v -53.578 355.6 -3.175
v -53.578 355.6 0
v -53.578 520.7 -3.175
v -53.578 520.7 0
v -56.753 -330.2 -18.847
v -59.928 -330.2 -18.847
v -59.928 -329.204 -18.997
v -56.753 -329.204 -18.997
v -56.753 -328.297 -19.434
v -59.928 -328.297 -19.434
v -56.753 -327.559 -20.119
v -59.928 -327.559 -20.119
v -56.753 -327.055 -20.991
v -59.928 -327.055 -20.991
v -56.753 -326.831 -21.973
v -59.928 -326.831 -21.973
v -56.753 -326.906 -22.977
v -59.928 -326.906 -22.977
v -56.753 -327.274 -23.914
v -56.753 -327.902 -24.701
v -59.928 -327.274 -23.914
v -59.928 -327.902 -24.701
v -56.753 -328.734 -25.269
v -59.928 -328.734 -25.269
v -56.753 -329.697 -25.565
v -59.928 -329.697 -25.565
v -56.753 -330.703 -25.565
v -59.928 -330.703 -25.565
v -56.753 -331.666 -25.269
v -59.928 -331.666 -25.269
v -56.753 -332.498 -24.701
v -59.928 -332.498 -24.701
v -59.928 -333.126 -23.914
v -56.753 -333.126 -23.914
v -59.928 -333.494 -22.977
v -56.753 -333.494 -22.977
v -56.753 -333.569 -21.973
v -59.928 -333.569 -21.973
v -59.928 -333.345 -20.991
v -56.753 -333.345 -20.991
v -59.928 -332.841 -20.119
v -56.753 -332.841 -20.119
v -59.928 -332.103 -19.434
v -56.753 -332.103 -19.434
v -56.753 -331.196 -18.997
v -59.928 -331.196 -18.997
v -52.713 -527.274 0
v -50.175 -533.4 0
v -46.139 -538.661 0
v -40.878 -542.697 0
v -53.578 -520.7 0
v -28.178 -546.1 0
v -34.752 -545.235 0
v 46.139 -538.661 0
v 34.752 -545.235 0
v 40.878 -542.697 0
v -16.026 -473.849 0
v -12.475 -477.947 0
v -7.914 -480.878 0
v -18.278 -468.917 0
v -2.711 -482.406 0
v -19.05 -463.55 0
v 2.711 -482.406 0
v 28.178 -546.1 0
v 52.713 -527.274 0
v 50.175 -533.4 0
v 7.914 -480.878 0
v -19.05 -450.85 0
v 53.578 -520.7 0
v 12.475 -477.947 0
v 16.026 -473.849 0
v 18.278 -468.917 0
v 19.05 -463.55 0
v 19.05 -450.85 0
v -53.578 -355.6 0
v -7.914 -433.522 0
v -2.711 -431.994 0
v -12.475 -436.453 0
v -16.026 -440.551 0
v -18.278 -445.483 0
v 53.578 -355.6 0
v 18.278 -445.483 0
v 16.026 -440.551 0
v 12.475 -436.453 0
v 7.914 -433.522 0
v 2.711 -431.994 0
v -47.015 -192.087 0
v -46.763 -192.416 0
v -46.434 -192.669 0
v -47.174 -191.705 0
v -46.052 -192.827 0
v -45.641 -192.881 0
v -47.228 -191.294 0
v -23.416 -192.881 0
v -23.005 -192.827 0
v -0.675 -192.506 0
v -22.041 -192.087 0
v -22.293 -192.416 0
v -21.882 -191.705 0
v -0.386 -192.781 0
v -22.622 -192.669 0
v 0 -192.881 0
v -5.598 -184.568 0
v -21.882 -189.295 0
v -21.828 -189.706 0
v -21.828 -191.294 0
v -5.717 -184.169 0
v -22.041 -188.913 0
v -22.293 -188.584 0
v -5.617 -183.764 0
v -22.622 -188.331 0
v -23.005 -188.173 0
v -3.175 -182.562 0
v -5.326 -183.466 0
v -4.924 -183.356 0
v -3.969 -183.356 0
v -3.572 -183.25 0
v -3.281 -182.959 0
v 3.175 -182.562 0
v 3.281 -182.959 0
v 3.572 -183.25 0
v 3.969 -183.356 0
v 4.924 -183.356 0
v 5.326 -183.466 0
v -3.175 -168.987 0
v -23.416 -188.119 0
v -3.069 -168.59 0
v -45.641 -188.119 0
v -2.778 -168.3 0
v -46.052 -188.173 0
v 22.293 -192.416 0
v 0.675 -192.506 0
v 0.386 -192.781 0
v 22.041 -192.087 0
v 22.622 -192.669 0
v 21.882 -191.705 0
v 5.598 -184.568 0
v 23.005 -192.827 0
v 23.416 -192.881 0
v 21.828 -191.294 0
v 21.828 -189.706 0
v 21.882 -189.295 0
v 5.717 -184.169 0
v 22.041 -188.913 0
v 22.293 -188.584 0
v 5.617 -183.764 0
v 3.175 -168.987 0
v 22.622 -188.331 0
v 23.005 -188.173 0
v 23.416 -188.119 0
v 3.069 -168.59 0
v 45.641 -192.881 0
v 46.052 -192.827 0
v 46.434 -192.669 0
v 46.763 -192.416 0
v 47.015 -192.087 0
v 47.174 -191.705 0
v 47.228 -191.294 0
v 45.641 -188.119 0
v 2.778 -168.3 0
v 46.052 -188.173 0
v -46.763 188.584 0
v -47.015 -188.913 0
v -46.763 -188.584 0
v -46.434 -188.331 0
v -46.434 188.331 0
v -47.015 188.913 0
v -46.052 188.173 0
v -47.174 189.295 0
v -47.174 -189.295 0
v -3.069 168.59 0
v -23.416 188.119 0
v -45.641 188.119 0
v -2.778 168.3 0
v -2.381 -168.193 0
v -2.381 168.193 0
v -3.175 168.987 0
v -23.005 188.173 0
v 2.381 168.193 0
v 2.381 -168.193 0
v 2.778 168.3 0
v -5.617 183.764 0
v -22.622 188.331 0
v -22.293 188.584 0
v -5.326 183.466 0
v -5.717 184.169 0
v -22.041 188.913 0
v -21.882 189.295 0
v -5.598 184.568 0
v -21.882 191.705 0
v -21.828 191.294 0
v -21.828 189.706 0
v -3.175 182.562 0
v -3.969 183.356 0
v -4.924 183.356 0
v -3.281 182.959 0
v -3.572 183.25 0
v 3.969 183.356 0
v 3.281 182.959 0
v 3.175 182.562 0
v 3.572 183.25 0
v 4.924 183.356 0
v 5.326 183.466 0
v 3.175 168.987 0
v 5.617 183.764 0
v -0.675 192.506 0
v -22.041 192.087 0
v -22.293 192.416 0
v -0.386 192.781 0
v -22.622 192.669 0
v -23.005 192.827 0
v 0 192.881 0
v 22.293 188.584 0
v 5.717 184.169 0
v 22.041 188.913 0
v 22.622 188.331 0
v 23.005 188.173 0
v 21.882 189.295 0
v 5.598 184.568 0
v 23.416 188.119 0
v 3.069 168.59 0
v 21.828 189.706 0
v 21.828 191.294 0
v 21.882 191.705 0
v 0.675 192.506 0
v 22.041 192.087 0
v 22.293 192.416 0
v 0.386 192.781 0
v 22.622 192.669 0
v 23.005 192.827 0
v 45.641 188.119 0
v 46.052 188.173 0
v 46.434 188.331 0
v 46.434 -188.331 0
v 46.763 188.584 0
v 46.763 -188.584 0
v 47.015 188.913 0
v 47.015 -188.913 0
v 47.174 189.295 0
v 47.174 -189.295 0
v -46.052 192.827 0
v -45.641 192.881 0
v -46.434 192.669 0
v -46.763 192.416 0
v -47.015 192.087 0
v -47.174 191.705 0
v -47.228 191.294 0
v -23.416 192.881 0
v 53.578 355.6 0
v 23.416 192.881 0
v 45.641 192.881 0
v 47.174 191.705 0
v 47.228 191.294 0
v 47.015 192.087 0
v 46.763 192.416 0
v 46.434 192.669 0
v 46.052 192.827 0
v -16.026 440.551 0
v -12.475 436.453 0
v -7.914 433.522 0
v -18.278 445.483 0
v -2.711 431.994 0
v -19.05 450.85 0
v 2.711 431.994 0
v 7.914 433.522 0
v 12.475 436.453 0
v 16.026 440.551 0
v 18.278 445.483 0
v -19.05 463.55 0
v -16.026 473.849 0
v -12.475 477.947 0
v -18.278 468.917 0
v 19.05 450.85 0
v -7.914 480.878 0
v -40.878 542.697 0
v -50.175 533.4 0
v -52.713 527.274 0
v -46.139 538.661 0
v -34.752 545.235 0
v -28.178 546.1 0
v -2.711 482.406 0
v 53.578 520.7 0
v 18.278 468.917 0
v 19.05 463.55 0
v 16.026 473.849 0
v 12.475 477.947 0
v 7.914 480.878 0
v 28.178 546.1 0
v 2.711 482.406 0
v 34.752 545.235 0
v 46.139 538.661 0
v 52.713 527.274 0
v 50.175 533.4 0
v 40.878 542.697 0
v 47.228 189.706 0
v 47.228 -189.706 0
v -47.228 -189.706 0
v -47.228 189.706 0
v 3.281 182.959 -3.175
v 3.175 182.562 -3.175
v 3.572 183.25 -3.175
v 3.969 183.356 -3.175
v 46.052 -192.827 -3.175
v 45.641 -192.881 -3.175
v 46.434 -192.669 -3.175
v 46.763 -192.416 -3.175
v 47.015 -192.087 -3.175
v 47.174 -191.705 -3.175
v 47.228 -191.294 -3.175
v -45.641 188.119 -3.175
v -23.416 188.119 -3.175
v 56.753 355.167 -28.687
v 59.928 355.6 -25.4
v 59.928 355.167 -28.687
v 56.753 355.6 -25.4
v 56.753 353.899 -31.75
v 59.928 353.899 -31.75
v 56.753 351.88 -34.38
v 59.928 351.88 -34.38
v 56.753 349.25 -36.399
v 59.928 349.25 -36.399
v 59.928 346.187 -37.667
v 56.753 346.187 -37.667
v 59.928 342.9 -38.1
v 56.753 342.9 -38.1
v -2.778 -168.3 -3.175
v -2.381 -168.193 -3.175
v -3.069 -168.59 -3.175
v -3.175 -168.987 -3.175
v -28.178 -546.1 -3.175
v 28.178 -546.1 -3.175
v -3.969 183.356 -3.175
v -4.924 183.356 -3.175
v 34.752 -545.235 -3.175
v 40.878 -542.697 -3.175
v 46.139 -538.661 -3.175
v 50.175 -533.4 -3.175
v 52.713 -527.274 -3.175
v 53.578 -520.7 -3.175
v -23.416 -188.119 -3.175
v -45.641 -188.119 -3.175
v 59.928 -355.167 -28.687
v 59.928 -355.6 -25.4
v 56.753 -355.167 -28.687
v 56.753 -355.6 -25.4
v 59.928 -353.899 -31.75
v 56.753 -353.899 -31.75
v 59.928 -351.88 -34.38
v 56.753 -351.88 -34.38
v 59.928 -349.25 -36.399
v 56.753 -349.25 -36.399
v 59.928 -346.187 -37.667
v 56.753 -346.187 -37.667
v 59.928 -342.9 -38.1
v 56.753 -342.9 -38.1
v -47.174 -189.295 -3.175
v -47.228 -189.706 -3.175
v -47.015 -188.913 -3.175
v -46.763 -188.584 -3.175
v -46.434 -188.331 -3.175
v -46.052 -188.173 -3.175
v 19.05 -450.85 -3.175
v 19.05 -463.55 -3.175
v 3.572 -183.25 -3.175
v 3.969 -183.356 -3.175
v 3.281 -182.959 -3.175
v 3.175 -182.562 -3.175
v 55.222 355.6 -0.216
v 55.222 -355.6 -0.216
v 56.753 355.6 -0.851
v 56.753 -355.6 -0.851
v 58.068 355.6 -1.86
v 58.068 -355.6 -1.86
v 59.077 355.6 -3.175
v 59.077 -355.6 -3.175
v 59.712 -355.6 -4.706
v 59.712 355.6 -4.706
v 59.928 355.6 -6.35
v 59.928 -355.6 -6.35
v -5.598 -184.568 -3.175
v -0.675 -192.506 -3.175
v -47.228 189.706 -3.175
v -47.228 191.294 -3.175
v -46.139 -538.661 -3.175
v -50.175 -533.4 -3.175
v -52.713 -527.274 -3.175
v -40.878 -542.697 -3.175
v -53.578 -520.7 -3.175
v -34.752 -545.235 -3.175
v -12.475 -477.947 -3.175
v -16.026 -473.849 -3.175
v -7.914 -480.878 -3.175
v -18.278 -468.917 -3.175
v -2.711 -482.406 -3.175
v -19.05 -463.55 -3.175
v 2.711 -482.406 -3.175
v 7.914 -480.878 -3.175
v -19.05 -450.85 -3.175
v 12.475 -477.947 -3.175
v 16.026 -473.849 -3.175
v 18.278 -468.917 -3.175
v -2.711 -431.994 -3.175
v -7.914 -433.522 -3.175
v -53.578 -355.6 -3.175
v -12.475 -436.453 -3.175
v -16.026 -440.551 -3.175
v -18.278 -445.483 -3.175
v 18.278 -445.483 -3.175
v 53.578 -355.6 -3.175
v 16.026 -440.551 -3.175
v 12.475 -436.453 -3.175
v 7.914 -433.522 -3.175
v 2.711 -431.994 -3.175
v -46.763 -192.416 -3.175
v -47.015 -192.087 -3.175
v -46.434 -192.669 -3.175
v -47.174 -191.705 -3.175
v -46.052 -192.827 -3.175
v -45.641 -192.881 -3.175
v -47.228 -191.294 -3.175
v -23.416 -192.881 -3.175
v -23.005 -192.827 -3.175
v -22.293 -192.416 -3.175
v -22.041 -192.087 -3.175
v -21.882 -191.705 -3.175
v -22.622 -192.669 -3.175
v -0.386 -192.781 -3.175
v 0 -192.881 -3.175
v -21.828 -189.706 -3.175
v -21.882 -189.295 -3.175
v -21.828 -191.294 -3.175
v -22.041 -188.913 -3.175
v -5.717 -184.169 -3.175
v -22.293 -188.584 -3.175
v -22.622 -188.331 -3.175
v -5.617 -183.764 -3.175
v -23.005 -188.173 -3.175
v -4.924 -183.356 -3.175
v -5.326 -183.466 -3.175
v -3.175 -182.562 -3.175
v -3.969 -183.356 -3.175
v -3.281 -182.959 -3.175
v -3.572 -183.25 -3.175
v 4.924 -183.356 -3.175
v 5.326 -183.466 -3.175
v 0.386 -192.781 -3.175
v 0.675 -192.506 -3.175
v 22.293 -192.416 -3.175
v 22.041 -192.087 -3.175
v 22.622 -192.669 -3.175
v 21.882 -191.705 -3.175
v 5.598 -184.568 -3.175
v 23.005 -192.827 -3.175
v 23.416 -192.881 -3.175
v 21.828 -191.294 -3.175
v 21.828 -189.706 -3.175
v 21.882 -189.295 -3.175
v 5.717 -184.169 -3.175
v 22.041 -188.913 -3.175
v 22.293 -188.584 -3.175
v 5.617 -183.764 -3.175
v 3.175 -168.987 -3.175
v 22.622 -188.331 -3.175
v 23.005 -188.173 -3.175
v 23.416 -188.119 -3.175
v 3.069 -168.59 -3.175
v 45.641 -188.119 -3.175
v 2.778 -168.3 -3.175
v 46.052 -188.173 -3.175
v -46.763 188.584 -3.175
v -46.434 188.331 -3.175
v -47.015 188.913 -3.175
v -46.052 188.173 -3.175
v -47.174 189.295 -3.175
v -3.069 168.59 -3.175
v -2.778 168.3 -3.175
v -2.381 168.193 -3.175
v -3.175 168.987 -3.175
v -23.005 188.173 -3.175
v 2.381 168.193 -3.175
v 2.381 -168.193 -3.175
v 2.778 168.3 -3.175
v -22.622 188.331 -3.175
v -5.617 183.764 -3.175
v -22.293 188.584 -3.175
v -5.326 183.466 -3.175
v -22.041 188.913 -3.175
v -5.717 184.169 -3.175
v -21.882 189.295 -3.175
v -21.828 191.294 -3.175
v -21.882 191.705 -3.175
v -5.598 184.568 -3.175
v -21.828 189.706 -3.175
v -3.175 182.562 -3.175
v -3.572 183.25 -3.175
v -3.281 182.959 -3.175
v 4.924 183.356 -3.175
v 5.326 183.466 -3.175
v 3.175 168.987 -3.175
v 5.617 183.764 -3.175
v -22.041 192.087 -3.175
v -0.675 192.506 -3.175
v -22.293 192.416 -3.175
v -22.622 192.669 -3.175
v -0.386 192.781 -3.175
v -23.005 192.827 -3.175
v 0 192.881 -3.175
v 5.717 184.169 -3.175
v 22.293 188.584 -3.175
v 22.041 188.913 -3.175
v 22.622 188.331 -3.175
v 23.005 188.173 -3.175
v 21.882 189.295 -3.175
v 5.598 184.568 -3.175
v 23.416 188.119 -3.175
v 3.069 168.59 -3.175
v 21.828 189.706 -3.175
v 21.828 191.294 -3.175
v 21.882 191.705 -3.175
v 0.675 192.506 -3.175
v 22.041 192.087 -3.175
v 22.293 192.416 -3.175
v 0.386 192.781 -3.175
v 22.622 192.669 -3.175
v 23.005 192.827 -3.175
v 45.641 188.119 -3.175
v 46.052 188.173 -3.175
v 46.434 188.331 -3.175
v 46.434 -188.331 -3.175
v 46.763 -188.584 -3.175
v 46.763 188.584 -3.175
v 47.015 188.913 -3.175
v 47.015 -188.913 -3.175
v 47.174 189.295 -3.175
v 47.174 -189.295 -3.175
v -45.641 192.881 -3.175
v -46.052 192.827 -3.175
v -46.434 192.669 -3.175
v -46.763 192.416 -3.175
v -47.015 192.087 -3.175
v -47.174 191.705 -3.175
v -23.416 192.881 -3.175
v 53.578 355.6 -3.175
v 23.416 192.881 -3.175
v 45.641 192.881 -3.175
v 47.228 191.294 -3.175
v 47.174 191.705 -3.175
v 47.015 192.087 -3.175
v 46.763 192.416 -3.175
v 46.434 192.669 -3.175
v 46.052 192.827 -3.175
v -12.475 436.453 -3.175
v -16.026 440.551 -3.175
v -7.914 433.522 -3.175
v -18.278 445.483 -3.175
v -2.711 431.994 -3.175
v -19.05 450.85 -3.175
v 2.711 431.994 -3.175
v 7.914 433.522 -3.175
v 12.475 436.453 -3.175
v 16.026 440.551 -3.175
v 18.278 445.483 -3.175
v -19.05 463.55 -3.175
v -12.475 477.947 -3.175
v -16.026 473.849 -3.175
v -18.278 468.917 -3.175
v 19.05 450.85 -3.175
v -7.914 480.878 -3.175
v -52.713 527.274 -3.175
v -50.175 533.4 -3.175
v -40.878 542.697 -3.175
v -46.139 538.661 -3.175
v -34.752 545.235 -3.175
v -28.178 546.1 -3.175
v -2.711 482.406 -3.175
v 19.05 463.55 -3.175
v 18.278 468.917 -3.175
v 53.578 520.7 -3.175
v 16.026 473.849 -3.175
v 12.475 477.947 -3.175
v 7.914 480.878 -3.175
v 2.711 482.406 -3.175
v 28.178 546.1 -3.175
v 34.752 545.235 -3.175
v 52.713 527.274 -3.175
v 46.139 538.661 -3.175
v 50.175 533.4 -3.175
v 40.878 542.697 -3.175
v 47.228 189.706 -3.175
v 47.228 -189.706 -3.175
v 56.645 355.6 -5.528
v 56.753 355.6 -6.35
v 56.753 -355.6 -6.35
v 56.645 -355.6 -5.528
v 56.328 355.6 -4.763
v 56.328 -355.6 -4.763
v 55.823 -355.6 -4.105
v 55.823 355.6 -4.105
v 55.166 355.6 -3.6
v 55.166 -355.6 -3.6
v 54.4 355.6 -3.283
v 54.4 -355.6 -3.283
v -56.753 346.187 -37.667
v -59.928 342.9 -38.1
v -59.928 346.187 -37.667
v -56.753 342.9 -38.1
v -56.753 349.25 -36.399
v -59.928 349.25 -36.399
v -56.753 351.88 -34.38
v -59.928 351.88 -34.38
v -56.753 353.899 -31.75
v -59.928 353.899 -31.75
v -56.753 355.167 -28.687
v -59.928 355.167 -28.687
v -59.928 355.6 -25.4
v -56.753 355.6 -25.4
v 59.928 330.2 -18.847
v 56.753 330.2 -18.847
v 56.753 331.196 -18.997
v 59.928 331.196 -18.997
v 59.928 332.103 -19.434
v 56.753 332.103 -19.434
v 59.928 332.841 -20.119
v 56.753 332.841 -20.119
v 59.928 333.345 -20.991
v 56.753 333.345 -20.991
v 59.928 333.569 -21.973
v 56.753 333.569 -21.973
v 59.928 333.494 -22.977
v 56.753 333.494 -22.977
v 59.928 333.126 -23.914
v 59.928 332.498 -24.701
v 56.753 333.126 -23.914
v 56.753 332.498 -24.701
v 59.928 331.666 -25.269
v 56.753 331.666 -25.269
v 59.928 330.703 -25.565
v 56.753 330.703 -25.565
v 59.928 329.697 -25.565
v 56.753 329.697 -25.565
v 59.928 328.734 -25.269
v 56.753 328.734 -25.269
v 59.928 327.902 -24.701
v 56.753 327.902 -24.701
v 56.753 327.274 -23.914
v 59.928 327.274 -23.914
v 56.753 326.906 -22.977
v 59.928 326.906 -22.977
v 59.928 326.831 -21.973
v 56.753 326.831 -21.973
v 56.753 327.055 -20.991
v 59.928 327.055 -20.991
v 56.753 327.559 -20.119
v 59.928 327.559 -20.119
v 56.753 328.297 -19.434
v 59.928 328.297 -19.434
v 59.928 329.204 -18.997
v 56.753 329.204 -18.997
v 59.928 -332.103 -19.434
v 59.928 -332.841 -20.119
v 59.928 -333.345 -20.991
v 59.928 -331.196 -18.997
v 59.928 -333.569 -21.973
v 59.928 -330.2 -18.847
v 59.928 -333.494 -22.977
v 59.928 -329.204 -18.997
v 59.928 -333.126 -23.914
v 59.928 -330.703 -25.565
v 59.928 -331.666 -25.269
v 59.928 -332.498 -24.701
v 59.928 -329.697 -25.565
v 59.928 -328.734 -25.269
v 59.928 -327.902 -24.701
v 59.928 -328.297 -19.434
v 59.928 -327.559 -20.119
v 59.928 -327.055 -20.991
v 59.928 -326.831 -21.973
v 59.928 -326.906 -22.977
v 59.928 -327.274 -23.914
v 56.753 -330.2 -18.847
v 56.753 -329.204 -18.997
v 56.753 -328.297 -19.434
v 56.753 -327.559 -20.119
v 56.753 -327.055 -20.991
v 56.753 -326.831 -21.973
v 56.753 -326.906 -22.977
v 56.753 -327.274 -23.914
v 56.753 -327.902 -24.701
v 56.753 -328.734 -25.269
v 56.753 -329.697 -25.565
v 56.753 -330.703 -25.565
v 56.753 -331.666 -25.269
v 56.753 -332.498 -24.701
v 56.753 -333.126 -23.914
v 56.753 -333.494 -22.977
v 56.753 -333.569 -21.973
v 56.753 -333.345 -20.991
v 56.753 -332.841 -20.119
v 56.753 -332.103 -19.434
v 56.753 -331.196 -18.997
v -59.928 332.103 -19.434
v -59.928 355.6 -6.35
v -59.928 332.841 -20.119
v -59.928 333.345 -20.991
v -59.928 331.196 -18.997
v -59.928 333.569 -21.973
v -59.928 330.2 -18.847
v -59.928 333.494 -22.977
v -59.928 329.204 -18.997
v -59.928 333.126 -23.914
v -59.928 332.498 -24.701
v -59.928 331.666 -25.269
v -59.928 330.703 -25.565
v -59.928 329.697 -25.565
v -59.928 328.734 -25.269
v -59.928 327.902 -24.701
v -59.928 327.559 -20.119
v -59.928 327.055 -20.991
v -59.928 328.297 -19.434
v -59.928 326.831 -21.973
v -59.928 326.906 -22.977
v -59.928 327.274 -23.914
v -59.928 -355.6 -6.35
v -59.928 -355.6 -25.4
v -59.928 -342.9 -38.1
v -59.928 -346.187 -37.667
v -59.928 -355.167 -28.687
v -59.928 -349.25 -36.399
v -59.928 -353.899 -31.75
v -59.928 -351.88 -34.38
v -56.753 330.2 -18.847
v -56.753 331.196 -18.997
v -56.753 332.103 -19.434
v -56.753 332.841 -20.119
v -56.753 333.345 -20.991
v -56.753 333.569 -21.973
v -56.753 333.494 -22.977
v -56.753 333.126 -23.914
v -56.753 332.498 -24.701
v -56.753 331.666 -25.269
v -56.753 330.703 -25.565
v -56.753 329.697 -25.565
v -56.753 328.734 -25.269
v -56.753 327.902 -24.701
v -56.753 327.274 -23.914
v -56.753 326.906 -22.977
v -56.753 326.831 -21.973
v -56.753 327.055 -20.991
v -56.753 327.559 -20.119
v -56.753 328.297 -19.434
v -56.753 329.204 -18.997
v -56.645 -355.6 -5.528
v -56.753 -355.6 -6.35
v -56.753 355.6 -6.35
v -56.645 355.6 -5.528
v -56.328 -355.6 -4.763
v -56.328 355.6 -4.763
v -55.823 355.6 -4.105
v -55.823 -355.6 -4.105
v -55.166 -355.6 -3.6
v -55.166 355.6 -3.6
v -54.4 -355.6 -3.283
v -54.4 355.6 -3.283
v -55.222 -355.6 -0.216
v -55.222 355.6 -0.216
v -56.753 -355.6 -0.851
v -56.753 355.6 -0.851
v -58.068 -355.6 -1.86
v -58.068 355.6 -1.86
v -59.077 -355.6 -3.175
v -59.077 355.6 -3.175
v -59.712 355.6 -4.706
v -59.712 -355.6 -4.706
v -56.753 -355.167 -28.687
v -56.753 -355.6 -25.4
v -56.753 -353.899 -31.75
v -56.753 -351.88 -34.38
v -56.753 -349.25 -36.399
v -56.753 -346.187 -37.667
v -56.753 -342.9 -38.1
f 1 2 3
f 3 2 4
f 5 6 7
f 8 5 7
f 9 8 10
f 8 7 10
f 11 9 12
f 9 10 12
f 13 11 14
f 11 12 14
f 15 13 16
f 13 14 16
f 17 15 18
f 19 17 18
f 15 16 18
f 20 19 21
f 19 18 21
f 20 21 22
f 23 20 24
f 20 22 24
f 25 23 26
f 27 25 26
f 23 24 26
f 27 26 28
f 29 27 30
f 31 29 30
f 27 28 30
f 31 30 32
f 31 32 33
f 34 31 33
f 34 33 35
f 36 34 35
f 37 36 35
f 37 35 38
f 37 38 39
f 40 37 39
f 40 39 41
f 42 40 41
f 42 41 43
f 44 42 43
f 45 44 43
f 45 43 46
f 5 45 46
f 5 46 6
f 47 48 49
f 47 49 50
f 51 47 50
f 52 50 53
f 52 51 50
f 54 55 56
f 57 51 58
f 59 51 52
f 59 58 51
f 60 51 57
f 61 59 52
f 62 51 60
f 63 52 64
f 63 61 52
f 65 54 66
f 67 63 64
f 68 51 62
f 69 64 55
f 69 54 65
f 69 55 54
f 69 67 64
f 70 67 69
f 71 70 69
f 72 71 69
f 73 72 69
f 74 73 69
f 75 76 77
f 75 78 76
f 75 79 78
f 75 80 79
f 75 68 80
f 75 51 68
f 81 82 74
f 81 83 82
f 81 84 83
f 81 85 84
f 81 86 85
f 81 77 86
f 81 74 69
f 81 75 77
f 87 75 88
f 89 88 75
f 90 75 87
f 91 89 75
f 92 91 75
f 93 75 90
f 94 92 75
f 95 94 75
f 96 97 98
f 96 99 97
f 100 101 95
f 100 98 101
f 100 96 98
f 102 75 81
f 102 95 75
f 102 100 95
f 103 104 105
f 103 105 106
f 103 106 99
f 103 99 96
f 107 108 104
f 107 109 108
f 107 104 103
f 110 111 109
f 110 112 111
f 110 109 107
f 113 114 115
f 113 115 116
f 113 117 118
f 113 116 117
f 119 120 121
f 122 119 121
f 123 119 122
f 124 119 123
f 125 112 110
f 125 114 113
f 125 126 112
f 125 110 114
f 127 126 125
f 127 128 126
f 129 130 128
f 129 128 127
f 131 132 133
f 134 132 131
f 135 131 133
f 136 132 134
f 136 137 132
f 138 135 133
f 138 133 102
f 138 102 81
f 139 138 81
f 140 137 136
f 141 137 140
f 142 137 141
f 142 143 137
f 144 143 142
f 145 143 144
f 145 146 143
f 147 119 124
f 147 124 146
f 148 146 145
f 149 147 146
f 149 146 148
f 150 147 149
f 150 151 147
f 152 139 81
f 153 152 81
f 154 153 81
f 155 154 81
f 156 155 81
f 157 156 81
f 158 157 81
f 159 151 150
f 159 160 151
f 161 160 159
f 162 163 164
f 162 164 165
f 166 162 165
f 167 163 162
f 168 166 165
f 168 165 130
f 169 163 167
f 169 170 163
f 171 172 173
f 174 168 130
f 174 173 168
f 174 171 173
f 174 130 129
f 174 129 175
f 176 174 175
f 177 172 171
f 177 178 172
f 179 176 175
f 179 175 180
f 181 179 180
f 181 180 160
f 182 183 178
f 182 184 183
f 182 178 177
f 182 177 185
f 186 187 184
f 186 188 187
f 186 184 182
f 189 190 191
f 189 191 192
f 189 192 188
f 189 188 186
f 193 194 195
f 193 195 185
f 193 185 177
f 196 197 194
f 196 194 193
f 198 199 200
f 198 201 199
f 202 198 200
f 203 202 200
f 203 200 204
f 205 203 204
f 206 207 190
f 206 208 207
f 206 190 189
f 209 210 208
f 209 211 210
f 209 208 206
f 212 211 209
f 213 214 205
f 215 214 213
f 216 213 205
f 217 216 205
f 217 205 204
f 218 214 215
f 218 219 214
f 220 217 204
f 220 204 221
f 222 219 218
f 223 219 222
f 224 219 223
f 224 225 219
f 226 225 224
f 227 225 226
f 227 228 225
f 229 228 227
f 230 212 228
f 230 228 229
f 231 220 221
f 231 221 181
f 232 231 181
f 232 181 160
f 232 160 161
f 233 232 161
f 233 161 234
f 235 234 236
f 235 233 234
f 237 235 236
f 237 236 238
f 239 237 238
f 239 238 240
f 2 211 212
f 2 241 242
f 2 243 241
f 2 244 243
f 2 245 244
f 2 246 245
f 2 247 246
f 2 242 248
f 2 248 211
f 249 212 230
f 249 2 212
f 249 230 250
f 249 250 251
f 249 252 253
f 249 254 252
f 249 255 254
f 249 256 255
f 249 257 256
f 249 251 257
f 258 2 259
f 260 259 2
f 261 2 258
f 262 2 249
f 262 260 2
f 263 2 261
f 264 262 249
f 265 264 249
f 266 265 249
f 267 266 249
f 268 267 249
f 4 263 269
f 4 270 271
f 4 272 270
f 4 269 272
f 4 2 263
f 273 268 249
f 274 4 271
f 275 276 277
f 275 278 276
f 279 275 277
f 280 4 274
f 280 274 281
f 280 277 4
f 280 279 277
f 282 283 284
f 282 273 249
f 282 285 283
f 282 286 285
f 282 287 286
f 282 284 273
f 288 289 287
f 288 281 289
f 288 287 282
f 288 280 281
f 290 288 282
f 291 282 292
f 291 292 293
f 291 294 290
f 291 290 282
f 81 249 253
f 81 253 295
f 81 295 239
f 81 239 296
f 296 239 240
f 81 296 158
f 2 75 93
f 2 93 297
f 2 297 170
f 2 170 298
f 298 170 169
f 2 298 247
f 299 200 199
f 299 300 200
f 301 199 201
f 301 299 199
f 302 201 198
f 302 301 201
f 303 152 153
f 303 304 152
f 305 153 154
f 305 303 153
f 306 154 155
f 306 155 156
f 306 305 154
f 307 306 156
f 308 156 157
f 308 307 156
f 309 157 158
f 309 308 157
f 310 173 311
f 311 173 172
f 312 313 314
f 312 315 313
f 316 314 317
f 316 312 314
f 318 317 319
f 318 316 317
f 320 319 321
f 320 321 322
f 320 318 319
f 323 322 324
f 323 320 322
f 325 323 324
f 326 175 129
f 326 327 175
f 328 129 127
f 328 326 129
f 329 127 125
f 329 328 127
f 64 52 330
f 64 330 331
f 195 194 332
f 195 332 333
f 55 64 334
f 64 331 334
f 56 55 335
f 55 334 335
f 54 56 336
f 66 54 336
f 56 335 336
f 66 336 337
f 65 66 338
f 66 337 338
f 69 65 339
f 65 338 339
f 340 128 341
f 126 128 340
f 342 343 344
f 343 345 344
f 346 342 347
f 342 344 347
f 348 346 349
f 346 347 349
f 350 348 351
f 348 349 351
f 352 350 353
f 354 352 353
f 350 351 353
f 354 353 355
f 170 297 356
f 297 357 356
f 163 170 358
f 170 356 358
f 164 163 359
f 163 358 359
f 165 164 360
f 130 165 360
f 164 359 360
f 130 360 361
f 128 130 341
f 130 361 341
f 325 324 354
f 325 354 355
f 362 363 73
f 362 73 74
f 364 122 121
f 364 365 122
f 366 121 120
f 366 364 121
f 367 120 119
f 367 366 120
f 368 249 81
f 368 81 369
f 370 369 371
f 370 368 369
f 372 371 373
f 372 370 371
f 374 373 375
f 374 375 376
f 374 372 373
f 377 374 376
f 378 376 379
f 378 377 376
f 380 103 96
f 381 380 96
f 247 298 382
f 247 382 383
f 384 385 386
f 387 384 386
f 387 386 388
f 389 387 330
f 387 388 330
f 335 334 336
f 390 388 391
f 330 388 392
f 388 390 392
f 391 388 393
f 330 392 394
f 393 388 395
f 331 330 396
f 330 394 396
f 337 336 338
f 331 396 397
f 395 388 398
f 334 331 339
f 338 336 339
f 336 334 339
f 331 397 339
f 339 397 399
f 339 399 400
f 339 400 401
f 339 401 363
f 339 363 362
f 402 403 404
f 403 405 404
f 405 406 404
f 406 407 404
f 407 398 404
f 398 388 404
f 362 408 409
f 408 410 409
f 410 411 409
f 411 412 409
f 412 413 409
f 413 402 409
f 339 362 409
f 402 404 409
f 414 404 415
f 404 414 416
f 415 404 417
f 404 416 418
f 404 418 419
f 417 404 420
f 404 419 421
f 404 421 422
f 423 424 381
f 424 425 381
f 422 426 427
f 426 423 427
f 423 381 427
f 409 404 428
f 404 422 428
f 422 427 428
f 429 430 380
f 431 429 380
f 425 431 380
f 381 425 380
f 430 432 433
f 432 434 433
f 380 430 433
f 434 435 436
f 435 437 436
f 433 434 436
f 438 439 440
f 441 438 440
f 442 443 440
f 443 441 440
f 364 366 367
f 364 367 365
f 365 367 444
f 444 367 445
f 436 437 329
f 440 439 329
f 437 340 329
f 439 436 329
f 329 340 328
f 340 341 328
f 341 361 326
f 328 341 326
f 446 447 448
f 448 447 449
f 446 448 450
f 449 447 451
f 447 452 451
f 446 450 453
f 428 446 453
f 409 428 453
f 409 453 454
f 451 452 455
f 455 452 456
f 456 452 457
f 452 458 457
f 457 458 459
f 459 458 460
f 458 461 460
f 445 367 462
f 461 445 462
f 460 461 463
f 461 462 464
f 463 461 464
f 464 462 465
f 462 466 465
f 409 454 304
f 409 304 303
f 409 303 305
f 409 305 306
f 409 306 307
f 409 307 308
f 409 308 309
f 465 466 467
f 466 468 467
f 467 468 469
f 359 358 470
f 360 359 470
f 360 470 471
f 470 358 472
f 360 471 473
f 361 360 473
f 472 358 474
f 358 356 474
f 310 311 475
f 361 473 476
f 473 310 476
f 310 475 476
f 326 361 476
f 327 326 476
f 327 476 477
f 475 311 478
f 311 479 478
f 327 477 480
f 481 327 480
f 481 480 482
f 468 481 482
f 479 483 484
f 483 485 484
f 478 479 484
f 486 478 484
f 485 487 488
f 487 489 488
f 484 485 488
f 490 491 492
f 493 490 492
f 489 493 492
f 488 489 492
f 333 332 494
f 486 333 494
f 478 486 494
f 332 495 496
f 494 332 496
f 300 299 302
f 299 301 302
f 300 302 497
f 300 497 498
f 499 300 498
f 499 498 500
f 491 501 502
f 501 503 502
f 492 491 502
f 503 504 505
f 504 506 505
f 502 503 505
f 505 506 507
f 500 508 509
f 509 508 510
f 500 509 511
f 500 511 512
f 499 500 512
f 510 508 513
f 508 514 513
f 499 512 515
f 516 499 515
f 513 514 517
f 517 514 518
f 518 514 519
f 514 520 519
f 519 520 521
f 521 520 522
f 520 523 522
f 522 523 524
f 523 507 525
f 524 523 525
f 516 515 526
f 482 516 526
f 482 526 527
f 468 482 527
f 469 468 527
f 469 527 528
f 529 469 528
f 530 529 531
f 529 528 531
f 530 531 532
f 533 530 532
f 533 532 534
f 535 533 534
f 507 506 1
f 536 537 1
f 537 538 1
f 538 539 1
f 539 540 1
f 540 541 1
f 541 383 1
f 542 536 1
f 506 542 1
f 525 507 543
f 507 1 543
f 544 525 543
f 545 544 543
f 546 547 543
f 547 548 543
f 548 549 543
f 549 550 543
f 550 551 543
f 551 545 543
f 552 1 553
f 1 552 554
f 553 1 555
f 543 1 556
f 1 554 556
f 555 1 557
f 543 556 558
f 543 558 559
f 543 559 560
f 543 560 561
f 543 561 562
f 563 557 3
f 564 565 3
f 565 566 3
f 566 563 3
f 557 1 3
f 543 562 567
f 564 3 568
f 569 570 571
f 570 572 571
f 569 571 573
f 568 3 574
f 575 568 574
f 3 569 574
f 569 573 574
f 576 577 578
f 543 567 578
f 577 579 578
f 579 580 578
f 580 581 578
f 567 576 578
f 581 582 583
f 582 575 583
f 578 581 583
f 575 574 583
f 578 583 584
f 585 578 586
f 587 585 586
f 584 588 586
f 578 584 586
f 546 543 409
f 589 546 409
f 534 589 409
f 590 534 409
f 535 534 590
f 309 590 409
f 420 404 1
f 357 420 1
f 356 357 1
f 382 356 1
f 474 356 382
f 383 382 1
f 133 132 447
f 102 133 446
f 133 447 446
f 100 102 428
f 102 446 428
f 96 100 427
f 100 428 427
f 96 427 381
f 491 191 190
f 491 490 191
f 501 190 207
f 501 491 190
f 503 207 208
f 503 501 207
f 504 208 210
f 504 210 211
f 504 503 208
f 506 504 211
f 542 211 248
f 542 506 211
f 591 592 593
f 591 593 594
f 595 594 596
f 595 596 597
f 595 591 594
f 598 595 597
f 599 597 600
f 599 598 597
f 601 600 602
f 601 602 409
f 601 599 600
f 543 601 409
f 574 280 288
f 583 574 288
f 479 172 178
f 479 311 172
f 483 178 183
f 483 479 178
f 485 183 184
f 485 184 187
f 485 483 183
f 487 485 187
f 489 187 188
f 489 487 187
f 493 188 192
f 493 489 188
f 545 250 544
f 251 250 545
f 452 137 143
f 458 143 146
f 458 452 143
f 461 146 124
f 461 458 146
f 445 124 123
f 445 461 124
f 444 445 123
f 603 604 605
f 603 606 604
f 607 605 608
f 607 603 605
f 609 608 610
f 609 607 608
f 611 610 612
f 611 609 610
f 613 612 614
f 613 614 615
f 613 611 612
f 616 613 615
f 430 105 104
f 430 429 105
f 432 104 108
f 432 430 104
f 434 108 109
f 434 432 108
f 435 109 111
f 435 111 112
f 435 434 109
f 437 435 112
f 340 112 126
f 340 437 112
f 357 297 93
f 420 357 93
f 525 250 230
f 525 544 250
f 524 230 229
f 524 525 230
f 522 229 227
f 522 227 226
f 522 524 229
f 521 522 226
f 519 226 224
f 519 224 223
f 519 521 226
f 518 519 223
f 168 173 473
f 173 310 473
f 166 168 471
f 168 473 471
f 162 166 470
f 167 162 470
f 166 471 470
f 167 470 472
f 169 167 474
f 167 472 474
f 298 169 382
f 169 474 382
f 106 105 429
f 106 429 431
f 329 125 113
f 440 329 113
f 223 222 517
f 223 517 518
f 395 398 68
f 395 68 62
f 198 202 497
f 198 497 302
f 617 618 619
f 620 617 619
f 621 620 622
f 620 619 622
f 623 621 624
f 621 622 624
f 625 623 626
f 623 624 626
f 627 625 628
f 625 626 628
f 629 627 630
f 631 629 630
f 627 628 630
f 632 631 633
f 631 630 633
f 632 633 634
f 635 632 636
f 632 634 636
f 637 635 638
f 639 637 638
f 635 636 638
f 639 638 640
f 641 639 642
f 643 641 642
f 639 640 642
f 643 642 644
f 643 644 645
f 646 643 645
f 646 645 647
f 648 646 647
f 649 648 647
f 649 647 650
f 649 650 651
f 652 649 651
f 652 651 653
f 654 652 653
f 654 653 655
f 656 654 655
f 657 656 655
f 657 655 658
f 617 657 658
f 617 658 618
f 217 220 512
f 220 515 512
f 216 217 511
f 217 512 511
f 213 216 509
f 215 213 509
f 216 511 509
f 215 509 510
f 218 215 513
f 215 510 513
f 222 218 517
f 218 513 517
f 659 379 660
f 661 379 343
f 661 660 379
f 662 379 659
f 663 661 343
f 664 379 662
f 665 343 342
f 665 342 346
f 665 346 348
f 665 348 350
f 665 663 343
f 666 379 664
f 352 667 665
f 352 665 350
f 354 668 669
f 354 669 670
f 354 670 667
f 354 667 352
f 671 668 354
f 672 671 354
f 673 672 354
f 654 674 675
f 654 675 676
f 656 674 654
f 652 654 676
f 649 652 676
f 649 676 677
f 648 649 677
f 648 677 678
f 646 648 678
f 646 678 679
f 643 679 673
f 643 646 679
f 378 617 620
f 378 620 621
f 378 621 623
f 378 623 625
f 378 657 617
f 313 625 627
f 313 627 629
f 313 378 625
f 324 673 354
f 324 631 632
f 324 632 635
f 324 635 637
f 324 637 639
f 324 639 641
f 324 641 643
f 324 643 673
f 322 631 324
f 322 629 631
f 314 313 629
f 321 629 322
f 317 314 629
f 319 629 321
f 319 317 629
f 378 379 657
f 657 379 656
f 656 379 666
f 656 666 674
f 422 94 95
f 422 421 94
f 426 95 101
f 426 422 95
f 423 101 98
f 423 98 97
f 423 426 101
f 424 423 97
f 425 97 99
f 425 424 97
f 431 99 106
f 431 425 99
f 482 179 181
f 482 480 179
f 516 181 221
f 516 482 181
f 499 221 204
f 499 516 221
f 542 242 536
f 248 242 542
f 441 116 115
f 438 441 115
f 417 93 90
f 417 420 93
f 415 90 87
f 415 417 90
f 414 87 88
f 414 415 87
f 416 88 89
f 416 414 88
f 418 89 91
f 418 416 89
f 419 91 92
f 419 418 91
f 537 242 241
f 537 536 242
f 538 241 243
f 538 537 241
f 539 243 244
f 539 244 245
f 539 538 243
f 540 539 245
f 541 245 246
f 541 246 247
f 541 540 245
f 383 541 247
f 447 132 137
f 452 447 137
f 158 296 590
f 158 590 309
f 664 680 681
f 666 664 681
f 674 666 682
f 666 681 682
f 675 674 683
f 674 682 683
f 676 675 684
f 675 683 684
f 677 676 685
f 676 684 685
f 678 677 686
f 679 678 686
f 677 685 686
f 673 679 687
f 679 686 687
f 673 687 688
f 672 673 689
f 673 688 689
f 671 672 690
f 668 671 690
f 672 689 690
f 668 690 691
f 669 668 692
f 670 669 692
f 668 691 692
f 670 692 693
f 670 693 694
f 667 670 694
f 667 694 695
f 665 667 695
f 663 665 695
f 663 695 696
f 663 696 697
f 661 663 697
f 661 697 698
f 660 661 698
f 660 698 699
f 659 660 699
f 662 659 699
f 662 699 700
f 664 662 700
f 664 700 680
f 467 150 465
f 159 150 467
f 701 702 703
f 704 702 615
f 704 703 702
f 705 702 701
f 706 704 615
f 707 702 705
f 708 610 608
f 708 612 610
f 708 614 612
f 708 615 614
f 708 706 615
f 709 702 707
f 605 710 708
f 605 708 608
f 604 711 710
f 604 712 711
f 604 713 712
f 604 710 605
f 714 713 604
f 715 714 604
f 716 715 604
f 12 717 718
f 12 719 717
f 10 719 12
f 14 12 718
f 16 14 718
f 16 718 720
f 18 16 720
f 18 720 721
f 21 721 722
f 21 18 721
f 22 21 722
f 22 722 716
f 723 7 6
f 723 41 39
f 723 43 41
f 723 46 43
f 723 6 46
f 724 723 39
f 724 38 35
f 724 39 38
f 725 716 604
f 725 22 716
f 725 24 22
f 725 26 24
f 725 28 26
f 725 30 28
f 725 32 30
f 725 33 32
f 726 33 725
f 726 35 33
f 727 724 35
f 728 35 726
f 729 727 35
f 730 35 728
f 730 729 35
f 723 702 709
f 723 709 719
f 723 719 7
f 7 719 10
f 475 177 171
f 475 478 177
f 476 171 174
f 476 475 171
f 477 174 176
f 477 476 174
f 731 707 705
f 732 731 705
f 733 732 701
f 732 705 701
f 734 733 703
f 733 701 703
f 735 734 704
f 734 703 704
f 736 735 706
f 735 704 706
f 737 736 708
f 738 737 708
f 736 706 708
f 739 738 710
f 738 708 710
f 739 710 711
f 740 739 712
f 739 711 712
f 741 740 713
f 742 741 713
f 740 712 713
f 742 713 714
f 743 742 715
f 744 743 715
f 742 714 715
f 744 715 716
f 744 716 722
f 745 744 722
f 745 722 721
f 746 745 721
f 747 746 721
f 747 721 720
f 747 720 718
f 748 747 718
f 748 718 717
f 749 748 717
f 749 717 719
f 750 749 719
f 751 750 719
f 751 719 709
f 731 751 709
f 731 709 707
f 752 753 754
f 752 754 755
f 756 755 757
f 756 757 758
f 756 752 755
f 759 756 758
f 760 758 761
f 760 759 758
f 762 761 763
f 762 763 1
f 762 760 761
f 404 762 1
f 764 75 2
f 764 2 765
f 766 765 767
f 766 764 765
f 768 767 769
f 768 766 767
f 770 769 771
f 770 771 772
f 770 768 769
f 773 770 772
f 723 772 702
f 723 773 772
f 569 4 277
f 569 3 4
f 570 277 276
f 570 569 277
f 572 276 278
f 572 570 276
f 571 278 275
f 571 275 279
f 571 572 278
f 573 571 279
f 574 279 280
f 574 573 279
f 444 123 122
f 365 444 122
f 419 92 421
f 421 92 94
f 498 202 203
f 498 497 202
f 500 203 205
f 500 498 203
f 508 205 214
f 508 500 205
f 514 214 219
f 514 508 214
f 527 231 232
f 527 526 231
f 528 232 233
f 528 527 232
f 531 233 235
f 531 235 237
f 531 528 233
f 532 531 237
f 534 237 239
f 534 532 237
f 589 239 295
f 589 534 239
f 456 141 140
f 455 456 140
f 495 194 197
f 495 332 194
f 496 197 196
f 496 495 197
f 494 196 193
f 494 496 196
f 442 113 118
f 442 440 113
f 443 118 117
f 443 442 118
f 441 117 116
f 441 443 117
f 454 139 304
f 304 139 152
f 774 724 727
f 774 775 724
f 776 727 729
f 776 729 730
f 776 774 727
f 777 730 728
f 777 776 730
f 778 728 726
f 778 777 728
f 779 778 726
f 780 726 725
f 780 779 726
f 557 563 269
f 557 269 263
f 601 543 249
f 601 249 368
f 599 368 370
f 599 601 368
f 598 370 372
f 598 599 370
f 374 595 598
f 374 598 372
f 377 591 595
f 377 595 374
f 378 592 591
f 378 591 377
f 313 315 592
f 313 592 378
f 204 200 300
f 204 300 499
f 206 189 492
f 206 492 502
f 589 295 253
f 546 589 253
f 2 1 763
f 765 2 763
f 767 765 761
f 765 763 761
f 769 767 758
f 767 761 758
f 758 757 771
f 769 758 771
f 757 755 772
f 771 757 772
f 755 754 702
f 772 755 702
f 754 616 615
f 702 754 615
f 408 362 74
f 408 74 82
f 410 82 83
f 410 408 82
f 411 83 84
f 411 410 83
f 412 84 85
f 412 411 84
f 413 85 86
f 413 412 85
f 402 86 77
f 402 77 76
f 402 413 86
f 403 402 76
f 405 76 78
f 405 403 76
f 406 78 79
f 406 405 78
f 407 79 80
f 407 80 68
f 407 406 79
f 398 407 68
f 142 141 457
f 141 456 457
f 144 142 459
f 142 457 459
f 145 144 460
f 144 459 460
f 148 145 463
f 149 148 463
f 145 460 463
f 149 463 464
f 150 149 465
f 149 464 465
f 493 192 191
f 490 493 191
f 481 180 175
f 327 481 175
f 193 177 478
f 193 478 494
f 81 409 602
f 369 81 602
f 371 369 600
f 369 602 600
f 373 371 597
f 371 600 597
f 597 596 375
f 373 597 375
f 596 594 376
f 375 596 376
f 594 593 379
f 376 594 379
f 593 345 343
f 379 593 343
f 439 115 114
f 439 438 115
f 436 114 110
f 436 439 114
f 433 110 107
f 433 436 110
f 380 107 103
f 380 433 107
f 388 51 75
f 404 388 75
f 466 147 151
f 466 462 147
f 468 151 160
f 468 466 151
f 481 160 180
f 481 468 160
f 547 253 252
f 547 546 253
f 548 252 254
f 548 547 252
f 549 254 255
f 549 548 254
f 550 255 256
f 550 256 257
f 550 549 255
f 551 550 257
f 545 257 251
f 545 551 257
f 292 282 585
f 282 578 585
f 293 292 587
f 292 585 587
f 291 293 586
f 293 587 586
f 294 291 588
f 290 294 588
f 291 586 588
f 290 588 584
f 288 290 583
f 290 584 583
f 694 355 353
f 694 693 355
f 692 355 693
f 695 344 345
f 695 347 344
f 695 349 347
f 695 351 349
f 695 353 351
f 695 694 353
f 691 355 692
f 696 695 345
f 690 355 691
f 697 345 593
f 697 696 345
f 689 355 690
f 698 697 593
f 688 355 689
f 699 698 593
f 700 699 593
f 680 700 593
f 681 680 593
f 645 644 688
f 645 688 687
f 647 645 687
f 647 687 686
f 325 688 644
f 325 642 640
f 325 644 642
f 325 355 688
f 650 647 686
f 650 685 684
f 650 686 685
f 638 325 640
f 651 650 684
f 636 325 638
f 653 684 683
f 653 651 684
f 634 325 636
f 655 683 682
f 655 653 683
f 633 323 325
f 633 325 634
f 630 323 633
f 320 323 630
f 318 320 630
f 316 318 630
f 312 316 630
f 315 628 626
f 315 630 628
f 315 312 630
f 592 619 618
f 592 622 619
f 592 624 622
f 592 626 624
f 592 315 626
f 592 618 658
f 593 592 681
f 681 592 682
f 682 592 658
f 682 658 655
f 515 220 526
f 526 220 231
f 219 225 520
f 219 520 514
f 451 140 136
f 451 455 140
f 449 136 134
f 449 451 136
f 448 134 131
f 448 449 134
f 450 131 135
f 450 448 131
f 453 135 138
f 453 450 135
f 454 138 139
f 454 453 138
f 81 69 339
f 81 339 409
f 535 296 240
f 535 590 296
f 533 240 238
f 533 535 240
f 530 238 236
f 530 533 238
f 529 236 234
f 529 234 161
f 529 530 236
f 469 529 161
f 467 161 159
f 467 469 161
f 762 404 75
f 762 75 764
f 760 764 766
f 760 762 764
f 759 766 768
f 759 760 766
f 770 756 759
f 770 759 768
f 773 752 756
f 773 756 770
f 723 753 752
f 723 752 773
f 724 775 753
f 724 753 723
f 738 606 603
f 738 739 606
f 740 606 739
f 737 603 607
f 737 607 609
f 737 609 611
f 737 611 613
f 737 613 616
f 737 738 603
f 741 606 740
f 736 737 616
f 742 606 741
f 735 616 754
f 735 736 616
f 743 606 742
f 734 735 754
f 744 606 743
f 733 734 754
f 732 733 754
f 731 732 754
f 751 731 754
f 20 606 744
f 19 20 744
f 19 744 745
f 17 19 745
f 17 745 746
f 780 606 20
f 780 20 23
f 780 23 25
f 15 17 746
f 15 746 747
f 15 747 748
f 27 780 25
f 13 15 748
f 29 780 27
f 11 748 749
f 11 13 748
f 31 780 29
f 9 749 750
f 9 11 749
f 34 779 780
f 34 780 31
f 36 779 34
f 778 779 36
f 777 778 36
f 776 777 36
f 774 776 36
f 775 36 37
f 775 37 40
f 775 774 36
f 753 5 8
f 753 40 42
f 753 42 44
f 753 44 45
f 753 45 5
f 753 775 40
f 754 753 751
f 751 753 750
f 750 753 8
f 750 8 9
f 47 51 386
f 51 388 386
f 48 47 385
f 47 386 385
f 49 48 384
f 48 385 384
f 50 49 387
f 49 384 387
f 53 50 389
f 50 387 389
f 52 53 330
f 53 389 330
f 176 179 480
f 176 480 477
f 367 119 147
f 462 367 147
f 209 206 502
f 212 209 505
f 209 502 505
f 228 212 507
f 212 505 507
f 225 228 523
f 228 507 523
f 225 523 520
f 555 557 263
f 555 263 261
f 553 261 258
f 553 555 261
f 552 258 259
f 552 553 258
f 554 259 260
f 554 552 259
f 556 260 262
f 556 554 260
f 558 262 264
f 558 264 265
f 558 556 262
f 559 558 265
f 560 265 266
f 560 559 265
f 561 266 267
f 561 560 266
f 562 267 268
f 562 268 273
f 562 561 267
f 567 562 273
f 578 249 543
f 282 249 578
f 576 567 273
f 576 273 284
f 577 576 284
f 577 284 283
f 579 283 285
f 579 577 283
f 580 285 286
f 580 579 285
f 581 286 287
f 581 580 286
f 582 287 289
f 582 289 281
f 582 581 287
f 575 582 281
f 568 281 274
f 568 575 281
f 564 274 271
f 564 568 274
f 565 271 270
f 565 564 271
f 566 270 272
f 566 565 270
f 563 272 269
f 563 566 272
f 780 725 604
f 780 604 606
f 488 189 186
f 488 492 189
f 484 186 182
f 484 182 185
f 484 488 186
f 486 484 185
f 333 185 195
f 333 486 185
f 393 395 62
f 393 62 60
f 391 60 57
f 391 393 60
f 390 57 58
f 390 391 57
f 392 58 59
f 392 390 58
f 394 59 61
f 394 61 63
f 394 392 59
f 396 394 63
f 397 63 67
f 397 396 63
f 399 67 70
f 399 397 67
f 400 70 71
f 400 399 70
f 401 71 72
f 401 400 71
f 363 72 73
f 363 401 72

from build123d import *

# Parameters (mm, degrees)
SKETCH1_W                 = 107.15625
SKETCH1_H                 = 1092.2
BASE_FLANGE1_DEPTH        = 3.175
EDGE_FLANGE1_DEPTH        = 711.2
EDGE_FLANGE1_BEND_DEPTH   = 711.2
F_1_4_CLEARANCE_HOLE1_D   = 6.7564
FILLET3_R                 = 12.7
FILLET4_R                 = 25.4
F_1_START                 = -3.175
F_1_1_5_DOWEL_SLOT1_DEPTH = 3.175
SKETCH25_W                = 25.4
SKETCH25_H                = 4.7625
CUT_EXTRUDE1_DEPTH        = 551.697920975
FILLET5_R                 = 0.79375
FILLET6_R                 = 1.5875
FILLET5_OF_MIRROR1_R      = 0.79375
FILLET6_OF_MIRROR1_R      = 1.5875


# Read off the part's stored shape, not the designer's step: 1 (1.5) Dowel Slot1
# Sheet-metal steps are written as plain solids
with BuildPart() as part:
    # Sketch1 → Base-Flange1 (new body)
    with BuildSketch(Plane.XY):
        Rectangle(SKETCH1_W, SKETCH1_H)
    extrude(amount=-BASE_FLANGE1_DEPTH)

    # Edge-Flange1 section (across the edge) → Edge-Flange1 (add)
    with BuildSketch(Plane(origin=(56.753125, 355.6, -3.175), x_dir=(-1, 0, 0), z_dir=(0, -1, 0))):
        with BuildLine():
            Line((-3.175, 3.175), (-3.175, 34.925))
            Line((-3.175, 34.925), (0, 34.925))
            Line((0, 34.925), (0, 3.175))
            ThreePointArc((0, 3.175), (0.92993597, 0.92993597), (3.175, 0))
            Line((3.175, 0), (3.175, -3.175))
            ThreePointArc((3.175, -3.175), (-1.315128061, -1.315128061), (-3.175, 3.175))
        make_face()
    extrude(amount=EDGE_FLANGE1_DEPTH)

    # Edge-Flange1 section 2 (across the edge) → Edge-Flange1 bend (add)
    with BuildSketch(Plane(origin=(-56.753125, -355.6, -3.175), x_dir=(1, 0, 0), z_dir=(0, 1, 0))):
        with BuildLine():
            Line((-3.175, 3.175), (-3.175, 34.925))
            Line((-3.175, 34.925), (0, 34.925))
            Line((0, 34.925), (0, 3.175))
            ThreePointArc((0, 3.175), (0.92993597, 0.92993597), (3.175, 0))
            Line((3.175, 0), (3.175, -3.175))
            ThreePointArc((3.175, -3.175), (-1.315128061, -1.315128061), (-3.175, 3.175))
        make_face()
    extrude(amount=EDGE_FLANGE1_BEND_DEPTH)

    # 1/4 Clearance Hole1 (through all)
    with Locations(Plane(origin=(59.928125, 0, 0), x_dir=(0, 0, -1), z_dir=(1, 0, 0))):
        with Locations((22.225, 330.2), (22.225, -330.2)):
            Hole(F_1_4_CLEARANCE_HOLE1_D / 2)

    # Fillet3
    fillet3_edges = [part.edges().sort_by_distance(p)[0] for p in [
        (58.340625, 355.6, -38.1),
        (58.340625, -355.6, -38.1),
        (-58.340625, -355.6, -38.1),
        (-58.340625, 355.6, -38.1),
    ]]
    fillet(fillet3_edges, radius=FILLET3_R)

    # Fillet4
    fillet4_edges = [part.edges().sort_by_distance(p)[0] for p in [
        (53.578125, -546.1, -1.5875),
        (-53.578125, -546.1, -1.5875),
        (-53.578125, 546.1, -1.5875),
        (53.578125, 546.1, -1.5875),
    ]]
    fillet(fillet4_edges, radius=FILLET4_R)

    # 1 (1.5) Dowel Slot1 outline → 1 (1.5) Dowel Slot1 (cut)
    with BuildSketch(Plane.XY.offset(F_1_START)):
        with BuildLine():
            ThreePointArc((-19.05, 450.85), (0, 431.8), (19.05, 450.85))
            Line((19.05, 450.85), (19.05, 463.55))
            ThreePointArc((19.05, 463.55), (0, 482.6), (-19.05, 463.55))
            Line((-19.05, 463.55), (-19.05, 450.85))
        make_face()
        with BuildLine():
            ThreePointArc((-19.05, -463.55), (0, -482.6), (19.05, -463.55))
            Line((19.05, -463.55), (19.05, -450.85))
            ThreePointArc((19.05, -450.85), (0, -431.8), (-19.05, -450.85))
            Line((-19.05, -450.85), (-19.05, -463.55))
        make_face()
    extrude(amount=F_1_1_5_DOWEL_SLOT1_DEPTH, mode=Mode.SUBTRACT)

    # Sketch25 → Cut-Extrude1 (cut, through all)
    with BuildSketch(Plane.XY):
        with Locations((-34.528125, 190.5)):
            Rectangle(SKETCH25_W, SKETCH25_H)
        Polygon((0, 193.59332287), (6.35, 183.35625), (3.175, 183.35625), (3.175, 168.19332287), (-3.175, 168.19332287), (-3.175, 183.35625), (-6.35, 183.35625), align=None)
        with Locations((34.528125, 190.5)):
            Rectangle(SKETCH25_W, SKETCH25_H)
    cut_extrude1 = extrude(amount=-CUT_EXTRUDE1_DEPTH, mode=Mode.SUBTRACT)

    # Fillet5
    fillet5_edges = [part.edges().sort_by_distance(p)[0] for p in [
        (-6.35, 183.35625, -1.5875),
        (0, 193.59332287, -1.5875),
        (6.35, 183.35625, -1.5875),
        (3.175, 183.35625, -1.5875),
        (3.175, 168.19332287, -1.5875),
        (-3.175, 168.19332287, -1.5875),
        (-3.175, 183.35625, -1.5875),
    ]]
    fillet(fillet5_edges, radius=FILLET5_R)

    # Fillet6
    fillet6_edges = [part.edges().sort_by_distance(p)[0] for p in [
        (-47.228125, 188.11875, -1.5875),
        (-47.228125, 192.88125, -1.5875),
        (-21.828125, 192.88125, -1.5875),
        (-21.828125, 188.11875, -1.5875),
        (47.228125, 192.88125, -1.5875),
        (47.228125, 188.11875, -1.5875),
        (21.828125, 188.11875, -1.5875),
        (21.828125, 192.88125, -1.5875),
    ]]
    fillet(fillet6_edges, radius=FILLET6_R)

    # Mirror1: Cut-Extrude1 across plane
    add(cut_extrude1.mirror(Plane.ZX), mode=Mode.SUBTRACT)

    # Fillet5 of Mirror1
    fillet5_of_mirror1_edges = [part.edges().sort_by_distance(p)[0] for p in [
        (-6.35, -183.35625, -1.5875),
        (0, -193.59332287, -1.5875),
        (6.35, -183.35625, -1.5875),
        (3.175, -183.35625, -1.5875),
        (3.175, -168.19332287, -1.5875),
        (-3.175, -168.19332287, -1.5875),
        (-3.175, -183.35625, -1.5875),
    ]]
    fillet(fillet5_of_mirror1_edges, radius=FILLET5_OF_MIRROR1_R)

    # Fillet6 of Mirror1
    fillet6_of_mirror1_edges = [part.edges().sort_by_distance(p)[0] for p in [
        (-47.228125, -188.11875, -1.5875),
        (-47.228125, -192.88125, -1.5875),
        (-21.828125, -192.88125, -1.5875),
        (-21.828125, -188.11875, -1.5875),
        (47.228125, -192.88125, -1.5875),
        (47.228125, -188.11875, -1.5875),
        (21.828125, -188.11875, -1.5875),
        (21.828125, -192.88125, -1.5875),
    ]]
    fillet(fillet6_of_mirror1_edges, radius=FILLET6_OF_MIRROR1_R)


solid = part.part
